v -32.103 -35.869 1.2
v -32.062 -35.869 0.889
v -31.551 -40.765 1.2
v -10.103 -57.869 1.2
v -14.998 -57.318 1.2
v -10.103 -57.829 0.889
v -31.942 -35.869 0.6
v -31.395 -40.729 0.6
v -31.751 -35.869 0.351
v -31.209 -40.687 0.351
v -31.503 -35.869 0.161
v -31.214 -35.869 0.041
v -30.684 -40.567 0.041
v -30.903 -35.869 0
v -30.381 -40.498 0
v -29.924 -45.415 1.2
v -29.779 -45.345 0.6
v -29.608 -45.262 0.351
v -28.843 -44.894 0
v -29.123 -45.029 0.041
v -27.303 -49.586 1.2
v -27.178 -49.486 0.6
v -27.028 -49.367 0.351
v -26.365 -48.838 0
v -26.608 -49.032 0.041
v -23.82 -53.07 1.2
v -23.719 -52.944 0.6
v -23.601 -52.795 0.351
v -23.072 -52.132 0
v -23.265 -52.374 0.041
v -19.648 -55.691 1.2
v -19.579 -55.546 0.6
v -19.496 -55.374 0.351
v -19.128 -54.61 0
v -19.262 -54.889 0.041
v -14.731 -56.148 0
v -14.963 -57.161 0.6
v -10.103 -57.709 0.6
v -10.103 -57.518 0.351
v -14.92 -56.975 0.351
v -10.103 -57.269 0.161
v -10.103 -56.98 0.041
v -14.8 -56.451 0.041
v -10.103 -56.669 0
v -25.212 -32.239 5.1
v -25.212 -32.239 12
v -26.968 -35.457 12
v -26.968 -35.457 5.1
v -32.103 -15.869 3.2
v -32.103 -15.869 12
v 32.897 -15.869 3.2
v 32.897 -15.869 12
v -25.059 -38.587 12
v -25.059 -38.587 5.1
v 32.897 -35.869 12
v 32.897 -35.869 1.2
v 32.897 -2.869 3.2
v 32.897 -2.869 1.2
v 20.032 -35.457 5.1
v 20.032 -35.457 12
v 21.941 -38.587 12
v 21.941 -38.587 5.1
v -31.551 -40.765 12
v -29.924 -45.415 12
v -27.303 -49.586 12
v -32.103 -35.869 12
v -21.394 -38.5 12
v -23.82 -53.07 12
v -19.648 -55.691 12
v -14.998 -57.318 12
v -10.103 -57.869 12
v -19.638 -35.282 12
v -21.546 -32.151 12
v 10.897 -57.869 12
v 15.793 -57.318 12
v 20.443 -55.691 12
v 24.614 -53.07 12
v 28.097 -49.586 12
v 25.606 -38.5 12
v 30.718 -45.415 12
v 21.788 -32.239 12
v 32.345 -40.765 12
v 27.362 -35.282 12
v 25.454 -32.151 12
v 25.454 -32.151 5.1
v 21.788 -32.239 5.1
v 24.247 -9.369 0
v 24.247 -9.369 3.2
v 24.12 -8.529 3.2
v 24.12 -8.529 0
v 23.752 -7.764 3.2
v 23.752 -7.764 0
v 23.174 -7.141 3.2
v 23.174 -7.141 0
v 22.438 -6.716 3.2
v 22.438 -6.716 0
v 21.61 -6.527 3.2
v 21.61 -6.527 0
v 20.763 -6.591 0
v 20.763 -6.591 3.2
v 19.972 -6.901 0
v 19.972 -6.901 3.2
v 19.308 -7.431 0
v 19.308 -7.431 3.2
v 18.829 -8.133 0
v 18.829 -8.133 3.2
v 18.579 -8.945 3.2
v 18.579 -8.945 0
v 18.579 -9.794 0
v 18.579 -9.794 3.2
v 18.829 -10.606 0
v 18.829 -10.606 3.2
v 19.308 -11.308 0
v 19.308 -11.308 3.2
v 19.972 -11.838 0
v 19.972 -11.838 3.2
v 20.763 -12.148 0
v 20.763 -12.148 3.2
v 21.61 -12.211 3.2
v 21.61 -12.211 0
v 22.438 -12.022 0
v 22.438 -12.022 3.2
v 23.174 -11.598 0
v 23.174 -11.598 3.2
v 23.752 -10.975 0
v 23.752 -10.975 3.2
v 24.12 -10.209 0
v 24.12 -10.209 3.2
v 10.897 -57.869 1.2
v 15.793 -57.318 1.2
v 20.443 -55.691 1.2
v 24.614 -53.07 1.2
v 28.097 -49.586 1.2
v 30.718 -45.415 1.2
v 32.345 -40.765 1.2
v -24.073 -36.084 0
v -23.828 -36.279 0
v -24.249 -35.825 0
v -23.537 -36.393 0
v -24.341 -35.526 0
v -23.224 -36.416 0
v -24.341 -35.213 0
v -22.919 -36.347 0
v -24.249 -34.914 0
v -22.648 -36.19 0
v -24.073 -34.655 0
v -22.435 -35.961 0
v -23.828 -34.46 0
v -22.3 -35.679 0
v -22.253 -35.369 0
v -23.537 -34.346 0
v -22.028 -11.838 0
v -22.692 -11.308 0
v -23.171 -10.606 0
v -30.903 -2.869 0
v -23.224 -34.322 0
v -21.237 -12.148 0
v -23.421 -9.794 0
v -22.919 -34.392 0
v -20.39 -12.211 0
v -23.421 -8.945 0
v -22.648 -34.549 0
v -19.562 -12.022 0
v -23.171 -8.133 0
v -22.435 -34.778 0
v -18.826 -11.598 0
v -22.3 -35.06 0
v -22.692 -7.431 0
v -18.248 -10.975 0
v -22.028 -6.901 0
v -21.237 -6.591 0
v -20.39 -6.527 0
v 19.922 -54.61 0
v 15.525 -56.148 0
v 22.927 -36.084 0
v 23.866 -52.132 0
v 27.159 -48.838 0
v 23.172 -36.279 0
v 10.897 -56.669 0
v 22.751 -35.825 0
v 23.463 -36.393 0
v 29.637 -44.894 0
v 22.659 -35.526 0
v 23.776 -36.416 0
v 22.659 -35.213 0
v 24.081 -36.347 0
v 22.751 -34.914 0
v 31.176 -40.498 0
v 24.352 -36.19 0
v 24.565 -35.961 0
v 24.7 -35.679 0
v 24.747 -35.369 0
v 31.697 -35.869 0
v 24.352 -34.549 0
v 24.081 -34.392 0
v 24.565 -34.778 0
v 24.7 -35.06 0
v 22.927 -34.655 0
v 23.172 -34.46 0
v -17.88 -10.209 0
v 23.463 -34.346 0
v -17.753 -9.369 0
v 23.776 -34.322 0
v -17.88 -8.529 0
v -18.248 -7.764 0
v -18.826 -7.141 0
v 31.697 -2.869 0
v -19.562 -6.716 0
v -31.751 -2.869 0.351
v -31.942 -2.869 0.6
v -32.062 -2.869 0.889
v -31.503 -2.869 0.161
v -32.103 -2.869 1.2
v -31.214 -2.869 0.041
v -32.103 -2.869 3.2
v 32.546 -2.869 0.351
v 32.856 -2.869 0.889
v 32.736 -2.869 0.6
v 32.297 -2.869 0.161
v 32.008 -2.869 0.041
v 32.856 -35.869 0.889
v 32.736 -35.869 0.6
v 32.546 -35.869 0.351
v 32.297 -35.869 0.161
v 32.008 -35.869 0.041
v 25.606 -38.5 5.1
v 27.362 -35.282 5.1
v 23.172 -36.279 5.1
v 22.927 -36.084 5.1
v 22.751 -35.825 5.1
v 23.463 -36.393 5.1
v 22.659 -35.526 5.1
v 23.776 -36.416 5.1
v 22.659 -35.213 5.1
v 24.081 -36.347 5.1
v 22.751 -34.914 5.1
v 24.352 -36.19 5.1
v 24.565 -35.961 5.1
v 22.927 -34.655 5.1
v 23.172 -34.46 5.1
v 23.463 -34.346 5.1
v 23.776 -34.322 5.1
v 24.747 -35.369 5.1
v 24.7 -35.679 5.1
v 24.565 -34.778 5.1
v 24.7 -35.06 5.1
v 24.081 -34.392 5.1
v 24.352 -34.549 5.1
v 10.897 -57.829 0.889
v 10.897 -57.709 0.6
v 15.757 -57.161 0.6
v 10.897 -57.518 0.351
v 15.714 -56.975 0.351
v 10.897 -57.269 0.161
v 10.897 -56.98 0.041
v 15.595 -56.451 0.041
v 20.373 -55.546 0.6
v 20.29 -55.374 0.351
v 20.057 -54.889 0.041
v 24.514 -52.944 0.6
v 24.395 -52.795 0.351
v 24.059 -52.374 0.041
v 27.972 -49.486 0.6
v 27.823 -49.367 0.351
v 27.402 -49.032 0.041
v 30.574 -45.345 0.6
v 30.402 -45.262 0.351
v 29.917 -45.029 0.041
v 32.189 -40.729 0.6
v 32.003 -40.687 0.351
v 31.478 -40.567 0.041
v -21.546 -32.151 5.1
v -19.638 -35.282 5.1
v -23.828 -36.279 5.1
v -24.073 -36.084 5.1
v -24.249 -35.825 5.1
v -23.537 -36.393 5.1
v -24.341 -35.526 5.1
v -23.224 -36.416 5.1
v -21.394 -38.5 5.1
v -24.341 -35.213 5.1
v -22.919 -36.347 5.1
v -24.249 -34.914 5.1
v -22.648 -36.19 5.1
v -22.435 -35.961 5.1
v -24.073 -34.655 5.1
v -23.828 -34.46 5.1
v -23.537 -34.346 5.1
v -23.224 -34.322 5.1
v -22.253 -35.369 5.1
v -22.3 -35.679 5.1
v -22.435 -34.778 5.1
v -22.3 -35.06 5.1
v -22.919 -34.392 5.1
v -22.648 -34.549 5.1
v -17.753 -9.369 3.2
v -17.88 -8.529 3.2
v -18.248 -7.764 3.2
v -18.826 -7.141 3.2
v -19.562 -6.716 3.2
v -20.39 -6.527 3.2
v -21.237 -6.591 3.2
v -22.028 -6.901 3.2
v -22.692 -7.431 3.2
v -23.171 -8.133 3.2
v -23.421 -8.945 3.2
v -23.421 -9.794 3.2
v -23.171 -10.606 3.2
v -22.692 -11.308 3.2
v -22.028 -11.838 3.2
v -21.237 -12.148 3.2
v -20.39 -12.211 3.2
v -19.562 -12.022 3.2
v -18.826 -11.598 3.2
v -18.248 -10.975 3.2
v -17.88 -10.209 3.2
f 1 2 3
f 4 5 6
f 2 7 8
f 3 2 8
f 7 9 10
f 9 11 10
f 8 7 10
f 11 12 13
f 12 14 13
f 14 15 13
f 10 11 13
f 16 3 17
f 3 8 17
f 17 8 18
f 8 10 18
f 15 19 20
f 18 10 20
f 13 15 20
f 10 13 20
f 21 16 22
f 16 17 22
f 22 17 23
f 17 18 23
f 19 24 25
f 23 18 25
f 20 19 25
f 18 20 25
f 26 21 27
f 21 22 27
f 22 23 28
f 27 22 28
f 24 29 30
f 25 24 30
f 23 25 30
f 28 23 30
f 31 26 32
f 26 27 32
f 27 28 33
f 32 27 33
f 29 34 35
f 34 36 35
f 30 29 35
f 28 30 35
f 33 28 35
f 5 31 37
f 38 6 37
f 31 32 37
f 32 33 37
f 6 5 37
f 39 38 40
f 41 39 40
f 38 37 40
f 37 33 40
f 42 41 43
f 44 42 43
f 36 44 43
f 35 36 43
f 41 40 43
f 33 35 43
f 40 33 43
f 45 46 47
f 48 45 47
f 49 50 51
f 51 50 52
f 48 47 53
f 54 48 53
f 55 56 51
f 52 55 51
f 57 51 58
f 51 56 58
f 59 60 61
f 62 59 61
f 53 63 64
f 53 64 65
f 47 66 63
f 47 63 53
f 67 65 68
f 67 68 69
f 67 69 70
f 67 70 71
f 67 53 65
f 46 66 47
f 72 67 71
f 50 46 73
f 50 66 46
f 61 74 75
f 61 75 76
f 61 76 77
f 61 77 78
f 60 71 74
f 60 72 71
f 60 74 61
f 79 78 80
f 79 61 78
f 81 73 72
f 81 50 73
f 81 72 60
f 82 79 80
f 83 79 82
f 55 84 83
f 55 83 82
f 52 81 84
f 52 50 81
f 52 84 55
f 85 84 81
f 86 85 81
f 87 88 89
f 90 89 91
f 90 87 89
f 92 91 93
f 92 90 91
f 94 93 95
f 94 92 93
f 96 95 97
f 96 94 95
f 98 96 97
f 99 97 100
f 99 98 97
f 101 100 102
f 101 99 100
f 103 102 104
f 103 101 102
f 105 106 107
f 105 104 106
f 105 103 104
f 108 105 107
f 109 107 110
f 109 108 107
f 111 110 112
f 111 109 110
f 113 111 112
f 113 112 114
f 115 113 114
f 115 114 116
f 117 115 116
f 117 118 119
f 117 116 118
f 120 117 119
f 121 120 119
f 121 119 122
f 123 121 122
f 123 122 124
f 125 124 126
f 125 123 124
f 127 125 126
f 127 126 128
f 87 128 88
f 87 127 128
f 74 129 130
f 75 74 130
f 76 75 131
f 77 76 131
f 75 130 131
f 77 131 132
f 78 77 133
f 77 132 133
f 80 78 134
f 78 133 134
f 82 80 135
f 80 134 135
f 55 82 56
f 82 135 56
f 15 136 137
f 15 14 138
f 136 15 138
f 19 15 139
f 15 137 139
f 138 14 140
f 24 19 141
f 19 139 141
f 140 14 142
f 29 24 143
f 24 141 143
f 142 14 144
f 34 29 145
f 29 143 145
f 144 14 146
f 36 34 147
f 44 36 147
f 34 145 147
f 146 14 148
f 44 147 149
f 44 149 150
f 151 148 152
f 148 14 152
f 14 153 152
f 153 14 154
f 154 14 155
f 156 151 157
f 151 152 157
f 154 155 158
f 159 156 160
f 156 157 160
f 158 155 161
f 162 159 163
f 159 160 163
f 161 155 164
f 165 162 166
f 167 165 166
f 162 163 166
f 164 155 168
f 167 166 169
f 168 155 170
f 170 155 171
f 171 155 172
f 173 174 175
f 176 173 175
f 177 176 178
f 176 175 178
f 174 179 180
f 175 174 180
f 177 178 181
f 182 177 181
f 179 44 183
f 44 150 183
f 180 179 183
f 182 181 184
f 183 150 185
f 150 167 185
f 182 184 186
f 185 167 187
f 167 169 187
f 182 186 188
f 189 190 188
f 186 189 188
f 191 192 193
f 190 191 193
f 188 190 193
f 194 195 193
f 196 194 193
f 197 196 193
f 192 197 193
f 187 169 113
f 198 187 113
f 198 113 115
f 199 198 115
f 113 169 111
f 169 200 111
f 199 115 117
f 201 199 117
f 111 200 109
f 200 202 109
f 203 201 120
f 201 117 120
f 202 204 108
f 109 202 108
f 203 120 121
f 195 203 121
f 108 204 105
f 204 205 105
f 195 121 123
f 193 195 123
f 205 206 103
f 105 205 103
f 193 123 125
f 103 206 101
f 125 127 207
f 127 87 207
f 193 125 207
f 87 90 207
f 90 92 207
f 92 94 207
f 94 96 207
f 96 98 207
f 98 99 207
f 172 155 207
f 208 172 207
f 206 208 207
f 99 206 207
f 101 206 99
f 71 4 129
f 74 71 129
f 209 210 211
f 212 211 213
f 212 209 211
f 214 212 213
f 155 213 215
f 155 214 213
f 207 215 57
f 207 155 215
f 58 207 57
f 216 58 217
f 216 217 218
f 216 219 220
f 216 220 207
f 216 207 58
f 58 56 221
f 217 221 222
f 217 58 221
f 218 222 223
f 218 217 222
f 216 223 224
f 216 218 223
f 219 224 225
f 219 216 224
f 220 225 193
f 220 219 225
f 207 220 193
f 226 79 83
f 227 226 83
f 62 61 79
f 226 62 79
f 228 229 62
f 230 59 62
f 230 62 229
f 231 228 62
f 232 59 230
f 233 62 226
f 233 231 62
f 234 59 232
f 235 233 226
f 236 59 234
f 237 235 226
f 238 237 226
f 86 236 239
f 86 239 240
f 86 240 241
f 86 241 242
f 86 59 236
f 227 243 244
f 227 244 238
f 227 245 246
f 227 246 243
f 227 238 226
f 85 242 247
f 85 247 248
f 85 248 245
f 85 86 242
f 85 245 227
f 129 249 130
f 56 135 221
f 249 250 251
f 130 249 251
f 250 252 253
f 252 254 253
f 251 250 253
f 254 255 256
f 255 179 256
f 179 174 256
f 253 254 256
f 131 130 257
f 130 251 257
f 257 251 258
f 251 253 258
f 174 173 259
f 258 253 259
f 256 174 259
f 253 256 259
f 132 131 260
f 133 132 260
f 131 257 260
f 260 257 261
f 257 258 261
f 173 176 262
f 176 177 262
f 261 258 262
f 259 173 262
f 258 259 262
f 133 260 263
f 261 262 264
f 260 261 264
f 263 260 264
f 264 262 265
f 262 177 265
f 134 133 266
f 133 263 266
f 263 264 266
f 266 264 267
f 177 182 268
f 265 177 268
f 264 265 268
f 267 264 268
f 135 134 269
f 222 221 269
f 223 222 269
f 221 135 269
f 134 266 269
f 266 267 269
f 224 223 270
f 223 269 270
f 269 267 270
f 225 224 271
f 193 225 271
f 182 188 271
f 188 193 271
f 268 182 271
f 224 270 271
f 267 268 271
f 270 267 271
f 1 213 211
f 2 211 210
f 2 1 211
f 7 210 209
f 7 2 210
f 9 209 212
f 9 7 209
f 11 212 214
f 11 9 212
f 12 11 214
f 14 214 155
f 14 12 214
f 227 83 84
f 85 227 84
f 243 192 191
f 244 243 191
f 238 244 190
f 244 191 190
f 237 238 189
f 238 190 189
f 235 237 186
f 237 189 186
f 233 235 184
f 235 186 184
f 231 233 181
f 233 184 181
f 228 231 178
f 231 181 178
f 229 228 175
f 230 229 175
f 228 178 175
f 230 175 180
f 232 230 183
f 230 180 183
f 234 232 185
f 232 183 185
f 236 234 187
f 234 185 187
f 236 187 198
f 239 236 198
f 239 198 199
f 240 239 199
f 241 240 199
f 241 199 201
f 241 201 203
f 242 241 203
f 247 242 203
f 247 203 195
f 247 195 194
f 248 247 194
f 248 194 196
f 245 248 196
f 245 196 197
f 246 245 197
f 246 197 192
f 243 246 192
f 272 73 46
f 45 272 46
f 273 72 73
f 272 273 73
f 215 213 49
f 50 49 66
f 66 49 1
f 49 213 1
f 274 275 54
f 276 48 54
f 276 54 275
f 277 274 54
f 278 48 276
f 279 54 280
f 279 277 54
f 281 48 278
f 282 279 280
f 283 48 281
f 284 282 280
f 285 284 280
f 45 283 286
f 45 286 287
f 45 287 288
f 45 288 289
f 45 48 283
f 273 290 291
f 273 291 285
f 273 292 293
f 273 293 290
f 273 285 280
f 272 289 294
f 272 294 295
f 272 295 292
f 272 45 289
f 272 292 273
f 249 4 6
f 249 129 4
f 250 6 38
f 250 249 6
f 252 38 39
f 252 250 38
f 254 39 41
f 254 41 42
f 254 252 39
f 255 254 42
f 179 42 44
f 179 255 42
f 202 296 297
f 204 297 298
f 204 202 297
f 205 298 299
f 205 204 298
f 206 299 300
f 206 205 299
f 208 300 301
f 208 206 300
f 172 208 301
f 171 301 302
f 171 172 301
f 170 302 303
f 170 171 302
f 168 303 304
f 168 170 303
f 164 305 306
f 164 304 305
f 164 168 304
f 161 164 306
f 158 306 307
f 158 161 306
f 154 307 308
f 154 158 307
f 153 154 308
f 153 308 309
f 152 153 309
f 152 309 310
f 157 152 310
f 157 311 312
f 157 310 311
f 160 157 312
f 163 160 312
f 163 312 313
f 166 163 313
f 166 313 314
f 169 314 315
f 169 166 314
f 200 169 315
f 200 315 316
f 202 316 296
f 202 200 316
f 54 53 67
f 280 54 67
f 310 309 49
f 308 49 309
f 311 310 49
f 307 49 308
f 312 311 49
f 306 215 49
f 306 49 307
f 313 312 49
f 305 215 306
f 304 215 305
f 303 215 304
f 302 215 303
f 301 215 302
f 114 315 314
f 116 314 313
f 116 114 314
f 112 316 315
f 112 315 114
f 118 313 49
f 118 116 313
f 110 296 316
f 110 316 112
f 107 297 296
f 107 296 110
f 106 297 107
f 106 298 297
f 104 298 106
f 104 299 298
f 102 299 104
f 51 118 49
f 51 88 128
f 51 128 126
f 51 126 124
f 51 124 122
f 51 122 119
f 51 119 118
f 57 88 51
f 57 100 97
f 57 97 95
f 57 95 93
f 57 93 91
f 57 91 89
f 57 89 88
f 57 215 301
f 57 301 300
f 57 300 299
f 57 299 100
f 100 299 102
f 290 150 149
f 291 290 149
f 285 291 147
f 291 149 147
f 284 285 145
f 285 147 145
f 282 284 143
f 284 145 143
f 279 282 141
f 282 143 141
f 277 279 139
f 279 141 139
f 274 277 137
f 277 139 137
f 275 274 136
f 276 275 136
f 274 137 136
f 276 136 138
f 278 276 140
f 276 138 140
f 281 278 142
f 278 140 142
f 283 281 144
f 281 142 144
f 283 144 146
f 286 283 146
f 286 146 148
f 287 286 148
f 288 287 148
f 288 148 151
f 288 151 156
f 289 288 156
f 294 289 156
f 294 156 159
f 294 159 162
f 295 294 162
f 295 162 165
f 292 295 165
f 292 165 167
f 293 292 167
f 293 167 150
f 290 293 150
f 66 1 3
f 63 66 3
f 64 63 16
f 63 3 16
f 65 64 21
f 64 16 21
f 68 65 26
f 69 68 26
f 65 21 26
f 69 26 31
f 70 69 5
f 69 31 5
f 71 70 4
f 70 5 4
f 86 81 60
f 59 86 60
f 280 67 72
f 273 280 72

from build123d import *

# Parameters (mm, degrees)
F0_W     = 65
F0_H     = 15
F0_R     = 2.85
F1_DEPTH = 12
F2_W     = 65
F2_H     = 13
F3_DEPTH = 8.8
F4_R     = 1.2
F5_R     = 1.05
F6_DEPTH = 15
F8_DEPTH = 6.9


with BuildPart() as f1:
    # F0 (on Top) → F1 (new body)
    with BuildSketch(Plane.XY):
        with Locations((0.397058, -10.369431)):
            Rectangle(F0_W, F0_H)
        with Locations((-20.602942, -9.369431)):
            Circle(F0_R, mode=Mode.SUBTRACT)
        with Locations((21.397058, -9.369431)):
            Circle(F0_R, mode=Mode.SUBTRACT)
        with BuildLine():
            Line((32.897058, -17.869431), (-32.102942, -17.869431))
            Line((-32.102942, -17.869431), (-32.102942, -35.869431))
            ThreePointArc((-32.102942, -35.869431), (-25.659291, -51.42578), (-10.102942, -57.869431))
            Line((-10.102942, -57.869431), (10.897058, -57.869431))
            ThreePointArc((10.897058, -57.869431), (26.453407, -51.42578), (32.897058, -35.869431))
            Line((32.897058, -35.869431), (32.897058, -17.869431))
        make_face()
    extrude(amount=F1_DEPTH)

    # F2 (on face) → F3 (cut)
    with BuildSketch(Plane.XY.offset(12)):
        with Locations((0.397058, -9.369431)):
            Rectangle(F2_W, F2_H)
    extrude(amount=-F3_DEPTH, mode=Mode.SUBTRACT)

    # F4
    f4_edges = [f1.edges().sort_by_distance(p)[0] for p in [
        (-32.102942, -19.369431, 0),
        (0.397058, -57.869431, 0),
        (32.897058, -19.369431, 0),
    ]]
    fillet(f4_edges, radius=F4_R)

    # F5 (on face) → F6 (cut)
    with BuildSketch(Plane(origin=(0, 0, 0), x_dir=(1, 0, 0), z_dir=(0, 0, -1))):
        with Locations((23.697058, 35.369431)):
            Circle(F5_R)
        with Locations((-23.302942, 35.369431)):
            Circle(F5_R)
    extrude(amount=-F6_DEPTH, mode=Mode.SUBTRACT)

    # F7 (on face) → F8 (cut)
    with BuildSketch(Plane.XY.offset(12)):
        Polygon((25.605654, -38.499621), (27.362181, -35.281633), (25.453585, -32.151443), (21.788462, -32.23924), (20.031935, -35.457228), (21.940531, -38.587419), align=None)
        Polygon((-21.394346, -38.499621), (-19.637819, -35.281633), (-21.546415, -32.151443), (-25.211538, -32.23924), (-26.968065, -35.457228), (-25.059469, -38.587419), align=None)
    extrude(amount=-F8_DEPTH, mode=Mode.SUBTRACT)


solid = f1.part
